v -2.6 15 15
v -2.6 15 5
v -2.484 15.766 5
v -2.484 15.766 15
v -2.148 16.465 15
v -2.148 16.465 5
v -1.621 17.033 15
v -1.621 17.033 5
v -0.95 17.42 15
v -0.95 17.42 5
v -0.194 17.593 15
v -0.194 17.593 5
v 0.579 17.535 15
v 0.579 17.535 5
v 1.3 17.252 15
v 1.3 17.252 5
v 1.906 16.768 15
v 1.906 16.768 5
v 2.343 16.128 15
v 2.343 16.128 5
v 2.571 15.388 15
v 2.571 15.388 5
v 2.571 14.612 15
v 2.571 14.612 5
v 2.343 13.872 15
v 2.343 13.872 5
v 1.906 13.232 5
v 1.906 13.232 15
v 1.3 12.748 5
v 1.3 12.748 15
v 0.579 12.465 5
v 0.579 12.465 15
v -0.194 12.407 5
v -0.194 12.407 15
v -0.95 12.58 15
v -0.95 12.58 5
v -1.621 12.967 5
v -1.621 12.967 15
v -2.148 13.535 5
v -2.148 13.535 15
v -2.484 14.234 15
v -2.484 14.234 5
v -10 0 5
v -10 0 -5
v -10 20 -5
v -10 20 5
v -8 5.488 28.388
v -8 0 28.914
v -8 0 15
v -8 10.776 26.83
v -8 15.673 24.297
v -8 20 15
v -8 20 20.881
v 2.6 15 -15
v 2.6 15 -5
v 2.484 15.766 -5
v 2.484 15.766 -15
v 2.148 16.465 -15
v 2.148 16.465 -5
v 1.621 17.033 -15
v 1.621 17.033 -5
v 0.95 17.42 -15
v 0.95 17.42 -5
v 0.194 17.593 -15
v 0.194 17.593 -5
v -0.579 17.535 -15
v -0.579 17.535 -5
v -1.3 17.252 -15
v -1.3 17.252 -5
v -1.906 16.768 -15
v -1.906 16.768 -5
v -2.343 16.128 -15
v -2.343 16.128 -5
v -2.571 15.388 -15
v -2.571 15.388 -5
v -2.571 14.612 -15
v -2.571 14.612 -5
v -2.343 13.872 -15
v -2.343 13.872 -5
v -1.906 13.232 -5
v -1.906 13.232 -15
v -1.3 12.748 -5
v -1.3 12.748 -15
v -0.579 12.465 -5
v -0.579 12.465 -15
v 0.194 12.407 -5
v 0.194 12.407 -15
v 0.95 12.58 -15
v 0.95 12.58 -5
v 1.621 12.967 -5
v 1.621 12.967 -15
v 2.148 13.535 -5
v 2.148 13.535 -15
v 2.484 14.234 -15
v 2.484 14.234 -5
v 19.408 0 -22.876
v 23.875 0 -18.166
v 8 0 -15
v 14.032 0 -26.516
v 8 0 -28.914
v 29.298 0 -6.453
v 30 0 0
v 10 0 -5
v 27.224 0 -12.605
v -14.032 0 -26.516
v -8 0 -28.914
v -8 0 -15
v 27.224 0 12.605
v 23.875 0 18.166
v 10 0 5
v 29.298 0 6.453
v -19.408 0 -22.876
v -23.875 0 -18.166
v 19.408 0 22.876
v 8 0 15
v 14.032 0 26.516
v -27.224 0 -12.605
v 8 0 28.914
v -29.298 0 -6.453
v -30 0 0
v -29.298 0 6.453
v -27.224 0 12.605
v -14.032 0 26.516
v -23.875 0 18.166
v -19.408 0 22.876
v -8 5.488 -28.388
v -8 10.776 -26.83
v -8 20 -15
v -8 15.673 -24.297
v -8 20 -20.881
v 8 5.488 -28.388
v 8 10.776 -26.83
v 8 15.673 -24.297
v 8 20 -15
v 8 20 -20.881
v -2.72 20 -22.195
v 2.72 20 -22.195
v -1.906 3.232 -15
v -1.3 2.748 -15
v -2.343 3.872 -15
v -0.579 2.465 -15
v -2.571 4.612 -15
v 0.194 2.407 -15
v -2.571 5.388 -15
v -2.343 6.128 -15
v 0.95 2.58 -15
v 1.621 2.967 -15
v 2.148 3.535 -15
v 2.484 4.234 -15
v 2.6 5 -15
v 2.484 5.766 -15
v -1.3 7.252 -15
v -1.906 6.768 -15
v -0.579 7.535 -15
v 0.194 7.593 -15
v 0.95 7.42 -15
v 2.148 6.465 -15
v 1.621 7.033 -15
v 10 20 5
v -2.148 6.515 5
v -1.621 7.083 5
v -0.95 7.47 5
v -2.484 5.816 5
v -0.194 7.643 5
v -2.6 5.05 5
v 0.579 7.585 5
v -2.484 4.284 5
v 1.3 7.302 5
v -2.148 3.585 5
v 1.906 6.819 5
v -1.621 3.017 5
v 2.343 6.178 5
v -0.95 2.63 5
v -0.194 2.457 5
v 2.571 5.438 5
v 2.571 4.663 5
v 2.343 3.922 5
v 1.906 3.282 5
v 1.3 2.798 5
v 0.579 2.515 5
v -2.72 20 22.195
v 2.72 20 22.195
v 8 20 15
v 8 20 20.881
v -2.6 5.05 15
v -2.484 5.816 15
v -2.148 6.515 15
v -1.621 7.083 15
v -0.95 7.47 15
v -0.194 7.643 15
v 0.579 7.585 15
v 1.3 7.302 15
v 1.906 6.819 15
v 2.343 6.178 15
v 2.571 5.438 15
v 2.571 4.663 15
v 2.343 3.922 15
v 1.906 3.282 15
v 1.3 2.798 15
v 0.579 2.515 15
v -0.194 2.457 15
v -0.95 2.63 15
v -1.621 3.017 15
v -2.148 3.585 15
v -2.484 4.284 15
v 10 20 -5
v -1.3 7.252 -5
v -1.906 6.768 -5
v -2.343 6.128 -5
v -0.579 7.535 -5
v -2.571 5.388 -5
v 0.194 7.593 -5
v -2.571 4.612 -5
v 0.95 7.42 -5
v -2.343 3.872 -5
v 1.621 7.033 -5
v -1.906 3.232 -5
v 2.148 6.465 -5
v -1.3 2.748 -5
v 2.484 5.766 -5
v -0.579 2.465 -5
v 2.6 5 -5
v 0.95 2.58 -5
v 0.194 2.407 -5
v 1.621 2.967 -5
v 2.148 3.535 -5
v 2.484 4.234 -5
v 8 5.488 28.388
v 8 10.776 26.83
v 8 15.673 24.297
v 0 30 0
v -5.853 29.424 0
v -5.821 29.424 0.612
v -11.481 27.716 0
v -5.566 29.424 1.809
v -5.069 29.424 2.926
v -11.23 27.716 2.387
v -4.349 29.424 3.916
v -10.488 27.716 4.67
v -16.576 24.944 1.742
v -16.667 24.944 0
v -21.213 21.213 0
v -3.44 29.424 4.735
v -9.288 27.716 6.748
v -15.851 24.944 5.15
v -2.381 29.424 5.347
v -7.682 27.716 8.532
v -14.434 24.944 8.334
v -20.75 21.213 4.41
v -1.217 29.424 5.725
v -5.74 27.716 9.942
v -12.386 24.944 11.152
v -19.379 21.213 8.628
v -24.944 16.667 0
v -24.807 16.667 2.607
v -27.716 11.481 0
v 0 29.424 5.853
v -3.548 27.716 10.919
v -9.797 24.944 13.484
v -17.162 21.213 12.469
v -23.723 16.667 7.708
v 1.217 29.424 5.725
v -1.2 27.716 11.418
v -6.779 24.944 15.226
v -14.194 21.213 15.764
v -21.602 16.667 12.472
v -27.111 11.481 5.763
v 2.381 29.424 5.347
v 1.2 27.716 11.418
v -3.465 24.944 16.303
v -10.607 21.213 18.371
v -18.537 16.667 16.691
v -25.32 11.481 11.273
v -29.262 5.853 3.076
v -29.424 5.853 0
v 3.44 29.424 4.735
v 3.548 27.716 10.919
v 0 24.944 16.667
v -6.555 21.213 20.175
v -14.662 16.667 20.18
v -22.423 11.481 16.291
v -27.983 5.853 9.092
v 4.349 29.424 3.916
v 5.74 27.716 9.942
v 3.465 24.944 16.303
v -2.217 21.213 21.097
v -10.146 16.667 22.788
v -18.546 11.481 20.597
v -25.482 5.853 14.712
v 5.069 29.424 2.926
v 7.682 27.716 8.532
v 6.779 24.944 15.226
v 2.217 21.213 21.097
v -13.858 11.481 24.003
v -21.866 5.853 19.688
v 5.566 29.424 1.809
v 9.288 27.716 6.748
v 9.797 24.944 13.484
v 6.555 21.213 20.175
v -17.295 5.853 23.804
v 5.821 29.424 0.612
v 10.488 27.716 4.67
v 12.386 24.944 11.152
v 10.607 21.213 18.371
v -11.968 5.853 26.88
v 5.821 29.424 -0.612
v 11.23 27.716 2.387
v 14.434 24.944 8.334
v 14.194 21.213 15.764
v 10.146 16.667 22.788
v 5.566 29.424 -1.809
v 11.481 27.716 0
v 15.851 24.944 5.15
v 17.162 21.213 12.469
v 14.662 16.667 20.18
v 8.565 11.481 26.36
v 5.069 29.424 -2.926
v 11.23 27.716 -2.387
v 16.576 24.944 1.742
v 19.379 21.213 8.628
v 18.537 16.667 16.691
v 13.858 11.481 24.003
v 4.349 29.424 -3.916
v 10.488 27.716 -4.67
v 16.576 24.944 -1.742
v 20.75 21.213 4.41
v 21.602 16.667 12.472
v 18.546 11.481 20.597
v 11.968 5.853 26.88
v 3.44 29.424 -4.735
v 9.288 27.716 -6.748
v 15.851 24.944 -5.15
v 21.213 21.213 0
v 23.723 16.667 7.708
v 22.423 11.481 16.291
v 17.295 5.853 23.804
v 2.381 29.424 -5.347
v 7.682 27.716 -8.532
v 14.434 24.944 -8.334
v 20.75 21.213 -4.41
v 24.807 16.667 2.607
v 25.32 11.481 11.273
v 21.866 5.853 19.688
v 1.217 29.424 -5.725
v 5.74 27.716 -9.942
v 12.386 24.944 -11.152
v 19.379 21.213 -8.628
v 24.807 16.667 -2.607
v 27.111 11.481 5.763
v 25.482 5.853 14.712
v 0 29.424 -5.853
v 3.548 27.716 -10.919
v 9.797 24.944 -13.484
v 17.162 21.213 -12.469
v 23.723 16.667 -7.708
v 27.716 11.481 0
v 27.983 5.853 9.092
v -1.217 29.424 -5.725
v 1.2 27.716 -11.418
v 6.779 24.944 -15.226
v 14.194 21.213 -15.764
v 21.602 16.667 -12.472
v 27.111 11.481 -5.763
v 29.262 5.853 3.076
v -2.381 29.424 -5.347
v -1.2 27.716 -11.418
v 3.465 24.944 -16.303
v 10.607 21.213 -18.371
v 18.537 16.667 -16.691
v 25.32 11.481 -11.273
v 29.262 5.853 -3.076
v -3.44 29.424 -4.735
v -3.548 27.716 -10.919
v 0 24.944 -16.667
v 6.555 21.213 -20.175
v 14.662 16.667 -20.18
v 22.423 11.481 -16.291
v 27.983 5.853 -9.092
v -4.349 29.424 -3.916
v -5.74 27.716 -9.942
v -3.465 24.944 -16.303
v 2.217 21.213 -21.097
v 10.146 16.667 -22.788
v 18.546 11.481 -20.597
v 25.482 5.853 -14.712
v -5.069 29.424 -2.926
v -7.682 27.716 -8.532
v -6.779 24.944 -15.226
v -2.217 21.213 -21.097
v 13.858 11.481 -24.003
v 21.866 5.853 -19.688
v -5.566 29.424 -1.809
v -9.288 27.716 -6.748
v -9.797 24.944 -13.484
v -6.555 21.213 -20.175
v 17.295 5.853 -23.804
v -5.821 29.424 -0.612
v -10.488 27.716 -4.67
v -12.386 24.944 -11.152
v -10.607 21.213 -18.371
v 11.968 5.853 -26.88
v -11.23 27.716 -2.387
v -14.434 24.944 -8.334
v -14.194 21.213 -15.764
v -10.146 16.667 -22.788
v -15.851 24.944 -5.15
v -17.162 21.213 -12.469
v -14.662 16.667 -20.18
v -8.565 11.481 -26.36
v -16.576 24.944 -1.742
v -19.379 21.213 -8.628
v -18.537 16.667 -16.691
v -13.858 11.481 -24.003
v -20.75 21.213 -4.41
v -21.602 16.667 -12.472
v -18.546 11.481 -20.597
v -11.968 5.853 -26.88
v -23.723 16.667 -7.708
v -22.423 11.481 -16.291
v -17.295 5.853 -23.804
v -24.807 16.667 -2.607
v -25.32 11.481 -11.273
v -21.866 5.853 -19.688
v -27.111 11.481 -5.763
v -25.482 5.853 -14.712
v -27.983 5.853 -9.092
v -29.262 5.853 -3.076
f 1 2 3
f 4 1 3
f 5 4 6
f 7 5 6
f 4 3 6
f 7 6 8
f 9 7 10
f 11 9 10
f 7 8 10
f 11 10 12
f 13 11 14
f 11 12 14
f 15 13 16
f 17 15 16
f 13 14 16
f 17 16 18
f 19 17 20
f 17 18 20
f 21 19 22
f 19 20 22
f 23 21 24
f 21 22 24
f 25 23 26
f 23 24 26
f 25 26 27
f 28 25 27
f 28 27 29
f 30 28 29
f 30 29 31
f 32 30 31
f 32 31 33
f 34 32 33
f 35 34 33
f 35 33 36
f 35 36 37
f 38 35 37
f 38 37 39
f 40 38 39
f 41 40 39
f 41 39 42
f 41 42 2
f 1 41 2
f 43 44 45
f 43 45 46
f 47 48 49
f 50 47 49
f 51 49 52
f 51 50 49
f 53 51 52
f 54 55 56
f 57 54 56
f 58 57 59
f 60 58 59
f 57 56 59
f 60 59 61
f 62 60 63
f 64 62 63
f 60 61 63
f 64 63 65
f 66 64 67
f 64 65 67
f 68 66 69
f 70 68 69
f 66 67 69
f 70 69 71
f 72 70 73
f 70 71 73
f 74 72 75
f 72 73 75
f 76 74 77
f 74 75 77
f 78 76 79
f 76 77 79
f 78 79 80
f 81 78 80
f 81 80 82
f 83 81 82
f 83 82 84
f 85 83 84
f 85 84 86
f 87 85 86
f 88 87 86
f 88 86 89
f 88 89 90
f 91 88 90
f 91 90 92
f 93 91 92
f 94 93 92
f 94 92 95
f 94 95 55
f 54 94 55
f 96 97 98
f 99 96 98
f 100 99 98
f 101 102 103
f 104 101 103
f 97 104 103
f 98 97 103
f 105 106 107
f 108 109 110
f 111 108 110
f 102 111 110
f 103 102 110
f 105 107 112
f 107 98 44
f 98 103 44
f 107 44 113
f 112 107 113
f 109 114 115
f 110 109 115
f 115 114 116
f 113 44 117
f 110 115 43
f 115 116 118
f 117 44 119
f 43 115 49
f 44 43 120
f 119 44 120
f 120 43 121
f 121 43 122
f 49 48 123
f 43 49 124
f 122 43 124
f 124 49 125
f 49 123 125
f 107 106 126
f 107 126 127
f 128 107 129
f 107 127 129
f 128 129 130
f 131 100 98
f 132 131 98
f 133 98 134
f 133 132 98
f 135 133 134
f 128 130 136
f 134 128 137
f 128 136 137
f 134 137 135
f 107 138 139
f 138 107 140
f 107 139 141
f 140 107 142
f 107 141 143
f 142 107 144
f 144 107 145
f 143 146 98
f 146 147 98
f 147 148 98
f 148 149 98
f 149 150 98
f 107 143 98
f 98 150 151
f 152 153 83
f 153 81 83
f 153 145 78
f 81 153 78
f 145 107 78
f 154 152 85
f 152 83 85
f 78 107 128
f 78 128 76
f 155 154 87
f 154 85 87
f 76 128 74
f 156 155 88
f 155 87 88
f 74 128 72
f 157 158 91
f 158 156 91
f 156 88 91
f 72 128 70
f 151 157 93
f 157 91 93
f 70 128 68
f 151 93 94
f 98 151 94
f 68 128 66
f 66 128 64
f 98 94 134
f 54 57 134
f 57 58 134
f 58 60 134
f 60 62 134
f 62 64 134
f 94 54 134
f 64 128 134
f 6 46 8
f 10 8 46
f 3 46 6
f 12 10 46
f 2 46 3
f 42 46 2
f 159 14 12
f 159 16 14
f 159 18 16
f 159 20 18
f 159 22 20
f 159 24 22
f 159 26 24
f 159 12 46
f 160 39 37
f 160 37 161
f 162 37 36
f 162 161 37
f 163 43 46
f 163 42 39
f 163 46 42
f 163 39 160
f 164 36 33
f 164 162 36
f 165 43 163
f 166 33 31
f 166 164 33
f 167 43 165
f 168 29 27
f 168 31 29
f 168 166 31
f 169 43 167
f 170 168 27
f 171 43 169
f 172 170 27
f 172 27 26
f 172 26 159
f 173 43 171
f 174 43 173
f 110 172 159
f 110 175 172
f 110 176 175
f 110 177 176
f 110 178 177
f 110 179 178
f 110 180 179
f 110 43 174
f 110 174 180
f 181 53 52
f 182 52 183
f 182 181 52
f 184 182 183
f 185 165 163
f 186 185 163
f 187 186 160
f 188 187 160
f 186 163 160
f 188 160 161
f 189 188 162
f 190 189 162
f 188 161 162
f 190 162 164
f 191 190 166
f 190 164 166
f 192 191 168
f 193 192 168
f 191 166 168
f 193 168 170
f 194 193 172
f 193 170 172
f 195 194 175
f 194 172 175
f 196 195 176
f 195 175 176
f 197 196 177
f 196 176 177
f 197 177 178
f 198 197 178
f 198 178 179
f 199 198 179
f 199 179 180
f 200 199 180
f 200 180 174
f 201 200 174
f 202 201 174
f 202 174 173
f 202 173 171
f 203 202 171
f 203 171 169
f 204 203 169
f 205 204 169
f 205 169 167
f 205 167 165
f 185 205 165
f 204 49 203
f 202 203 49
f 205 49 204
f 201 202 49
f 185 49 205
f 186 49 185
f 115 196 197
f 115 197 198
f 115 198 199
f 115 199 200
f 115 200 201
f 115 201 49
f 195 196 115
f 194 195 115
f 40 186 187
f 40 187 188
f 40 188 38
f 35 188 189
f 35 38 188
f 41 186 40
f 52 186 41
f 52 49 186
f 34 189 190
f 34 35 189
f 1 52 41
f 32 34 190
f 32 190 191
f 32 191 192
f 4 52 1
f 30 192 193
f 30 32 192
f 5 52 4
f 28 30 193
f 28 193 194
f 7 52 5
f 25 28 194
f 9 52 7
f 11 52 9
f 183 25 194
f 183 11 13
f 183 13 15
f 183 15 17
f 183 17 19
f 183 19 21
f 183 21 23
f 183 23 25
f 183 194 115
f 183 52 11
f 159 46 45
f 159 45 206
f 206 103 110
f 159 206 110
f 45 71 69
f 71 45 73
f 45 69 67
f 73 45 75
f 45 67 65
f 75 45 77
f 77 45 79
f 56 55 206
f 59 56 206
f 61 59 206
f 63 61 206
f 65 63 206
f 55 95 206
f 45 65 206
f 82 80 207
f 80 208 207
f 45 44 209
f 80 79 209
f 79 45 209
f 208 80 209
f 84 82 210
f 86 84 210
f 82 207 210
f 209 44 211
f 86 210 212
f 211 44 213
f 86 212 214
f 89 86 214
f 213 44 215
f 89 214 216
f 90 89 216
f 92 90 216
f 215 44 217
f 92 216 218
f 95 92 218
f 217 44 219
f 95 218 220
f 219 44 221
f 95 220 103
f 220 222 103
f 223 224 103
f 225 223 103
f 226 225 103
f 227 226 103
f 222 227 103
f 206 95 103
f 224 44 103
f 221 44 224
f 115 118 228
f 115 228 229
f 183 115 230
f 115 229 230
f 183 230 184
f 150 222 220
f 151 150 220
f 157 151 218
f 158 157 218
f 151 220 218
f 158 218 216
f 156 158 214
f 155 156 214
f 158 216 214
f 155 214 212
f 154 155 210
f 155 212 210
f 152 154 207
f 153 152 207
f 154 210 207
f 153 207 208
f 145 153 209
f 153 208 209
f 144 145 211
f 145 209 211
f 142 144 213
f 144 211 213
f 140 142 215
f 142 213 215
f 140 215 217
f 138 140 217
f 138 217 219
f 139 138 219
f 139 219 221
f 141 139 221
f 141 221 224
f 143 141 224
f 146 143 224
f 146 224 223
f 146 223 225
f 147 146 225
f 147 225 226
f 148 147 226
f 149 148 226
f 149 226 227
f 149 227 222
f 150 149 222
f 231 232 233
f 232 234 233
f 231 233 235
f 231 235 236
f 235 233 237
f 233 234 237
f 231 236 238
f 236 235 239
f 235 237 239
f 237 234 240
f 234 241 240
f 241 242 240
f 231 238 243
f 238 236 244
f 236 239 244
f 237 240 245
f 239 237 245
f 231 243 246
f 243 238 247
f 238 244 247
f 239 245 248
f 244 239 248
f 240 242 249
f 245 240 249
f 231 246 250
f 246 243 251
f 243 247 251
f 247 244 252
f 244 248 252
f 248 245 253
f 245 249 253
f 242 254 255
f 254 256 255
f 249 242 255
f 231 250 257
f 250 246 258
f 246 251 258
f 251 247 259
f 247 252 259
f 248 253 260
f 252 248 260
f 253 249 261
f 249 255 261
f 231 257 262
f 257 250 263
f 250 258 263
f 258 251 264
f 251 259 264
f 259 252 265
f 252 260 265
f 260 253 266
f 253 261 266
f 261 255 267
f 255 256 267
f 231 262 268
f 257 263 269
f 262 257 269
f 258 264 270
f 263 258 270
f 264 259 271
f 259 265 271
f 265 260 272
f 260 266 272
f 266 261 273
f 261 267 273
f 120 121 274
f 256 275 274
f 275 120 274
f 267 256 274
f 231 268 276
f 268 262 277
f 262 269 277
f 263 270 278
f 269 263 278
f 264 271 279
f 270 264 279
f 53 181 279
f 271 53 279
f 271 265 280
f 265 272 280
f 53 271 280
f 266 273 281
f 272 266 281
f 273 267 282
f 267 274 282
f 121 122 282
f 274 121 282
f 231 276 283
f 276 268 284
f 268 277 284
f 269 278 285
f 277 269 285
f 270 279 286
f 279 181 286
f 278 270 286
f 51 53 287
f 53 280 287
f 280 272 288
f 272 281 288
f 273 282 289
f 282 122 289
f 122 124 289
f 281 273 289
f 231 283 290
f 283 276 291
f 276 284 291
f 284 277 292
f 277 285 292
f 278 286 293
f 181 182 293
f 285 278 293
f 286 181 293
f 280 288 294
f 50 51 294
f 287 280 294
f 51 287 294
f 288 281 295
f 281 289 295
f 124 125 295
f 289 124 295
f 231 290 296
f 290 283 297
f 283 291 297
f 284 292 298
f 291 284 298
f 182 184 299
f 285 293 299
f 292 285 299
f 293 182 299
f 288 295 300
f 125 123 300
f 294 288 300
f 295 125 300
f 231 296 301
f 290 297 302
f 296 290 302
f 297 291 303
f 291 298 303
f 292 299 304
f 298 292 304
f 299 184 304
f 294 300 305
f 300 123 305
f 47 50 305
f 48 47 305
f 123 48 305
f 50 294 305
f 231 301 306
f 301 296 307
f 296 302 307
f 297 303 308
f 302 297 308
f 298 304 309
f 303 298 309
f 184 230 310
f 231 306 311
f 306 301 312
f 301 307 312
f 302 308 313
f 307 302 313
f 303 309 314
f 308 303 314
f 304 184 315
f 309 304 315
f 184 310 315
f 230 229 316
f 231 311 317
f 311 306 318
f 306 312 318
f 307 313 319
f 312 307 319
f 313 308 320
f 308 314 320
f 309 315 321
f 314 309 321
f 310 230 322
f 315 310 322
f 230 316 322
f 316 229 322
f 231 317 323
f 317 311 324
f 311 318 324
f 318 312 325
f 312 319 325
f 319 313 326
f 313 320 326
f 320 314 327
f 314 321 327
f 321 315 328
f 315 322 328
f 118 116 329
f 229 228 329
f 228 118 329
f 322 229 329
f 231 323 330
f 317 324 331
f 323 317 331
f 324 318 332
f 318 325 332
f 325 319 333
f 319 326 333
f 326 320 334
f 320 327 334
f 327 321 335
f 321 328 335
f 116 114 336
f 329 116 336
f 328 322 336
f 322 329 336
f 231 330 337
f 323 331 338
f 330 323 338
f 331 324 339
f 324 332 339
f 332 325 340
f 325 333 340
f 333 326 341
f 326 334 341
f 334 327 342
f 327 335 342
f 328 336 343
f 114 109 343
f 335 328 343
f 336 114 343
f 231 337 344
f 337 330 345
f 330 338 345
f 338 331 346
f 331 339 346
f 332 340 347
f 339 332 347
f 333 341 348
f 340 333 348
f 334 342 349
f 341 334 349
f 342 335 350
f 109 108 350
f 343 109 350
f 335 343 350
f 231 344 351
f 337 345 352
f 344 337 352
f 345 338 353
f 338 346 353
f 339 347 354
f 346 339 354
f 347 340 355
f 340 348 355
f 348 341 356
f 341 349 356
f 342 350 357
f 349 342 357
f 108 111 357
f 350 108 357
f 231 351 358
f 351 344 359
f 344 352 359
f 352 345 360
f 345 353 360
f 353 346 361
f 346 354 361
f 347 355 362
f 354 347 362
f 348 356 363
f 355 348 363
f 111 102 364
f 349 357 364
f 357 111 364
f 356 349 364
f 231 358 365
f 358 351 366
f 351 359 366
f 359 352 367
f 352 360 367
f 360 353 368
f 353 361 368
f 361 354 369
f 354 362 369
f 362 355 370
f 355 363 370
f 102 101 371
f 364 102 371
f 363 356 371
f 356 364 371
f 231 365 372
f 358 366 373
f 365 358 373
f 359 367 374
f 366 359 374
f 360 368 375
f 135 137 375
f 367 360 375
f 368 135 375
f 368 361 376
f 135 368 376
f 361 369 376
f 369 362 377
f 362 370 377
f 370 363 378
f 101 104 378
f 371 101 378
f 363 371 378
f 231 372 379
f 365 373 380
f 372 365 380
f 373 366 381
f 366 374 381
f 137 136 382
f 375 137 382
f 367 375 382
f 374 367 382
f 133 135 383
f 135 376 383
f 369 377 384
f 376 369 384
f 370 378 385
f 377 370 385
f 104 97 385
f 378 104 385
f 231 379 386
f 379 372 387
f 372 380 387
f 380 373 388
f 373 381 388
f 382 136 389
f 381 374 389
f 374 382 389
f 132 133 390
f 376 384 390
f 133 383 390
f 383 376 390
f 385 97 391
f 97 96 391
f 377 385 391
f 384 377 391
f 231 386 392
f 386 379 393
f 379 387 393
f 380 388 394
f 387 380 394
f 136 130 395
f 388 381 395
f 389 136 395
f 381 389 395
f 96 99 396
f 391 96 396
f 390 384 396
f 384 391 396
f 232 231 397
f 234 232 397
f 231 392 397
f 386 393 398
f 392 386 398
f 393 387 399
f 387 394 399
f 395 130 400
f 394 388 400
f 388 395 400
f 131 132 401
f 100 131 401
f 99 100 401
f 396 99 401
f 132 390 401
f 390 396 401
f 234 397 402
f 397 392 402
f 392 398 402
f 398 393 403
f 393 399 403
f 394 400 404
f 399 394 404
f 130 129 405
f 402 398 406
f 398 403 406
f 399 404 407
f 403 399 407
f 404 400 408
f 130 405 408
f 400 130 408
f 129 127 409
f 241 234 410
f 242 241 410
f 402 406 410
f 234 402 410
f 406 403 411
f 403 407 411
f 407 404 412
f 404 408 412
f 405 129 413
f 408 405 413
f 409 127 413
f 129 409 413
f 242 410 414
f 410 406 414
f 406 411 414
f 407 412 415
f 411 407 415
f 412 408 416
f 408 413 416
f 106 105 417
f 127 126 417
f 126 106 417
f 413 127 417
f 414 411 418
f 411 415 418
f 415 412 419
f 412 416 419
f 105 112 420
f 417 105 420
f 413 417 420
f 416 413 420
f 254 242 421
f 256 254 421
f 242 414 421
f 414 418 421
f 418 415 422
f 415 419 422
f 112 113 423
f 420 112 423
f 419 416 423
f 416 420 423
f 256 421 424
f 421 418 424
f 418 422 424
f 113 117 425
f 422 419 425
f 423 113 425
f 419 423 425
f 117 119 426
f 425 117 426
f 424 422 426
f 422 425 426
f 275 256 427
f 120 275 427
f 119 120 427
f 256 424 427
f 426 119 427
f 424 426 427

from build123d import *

# Parameters (mm, degrees)
SKETCH3_W           = 20
SKETCH3_H           = 10
CUT_EXTRUDE1_DEPTH  = 20
SKETCH4_R           = 2.6
CUT_EXTRUDE2_DEPTH  = 26
SKETCH7_R           = 2.6
CUT_EXTRUDE4_DEPTH  = 26
SKETCH8_W           = 16
SKETCH8_H           = 20
CUT_EXTRUDE9_DEPTH  = 15
SKETCH6_W           = 16
SKETCH6_H           = 20
CUT_EXTRUDE10_DEPTH = 15


with BuildPart() as part:
    # Sketch2 → Revolve1 (revolve)
    with BuildSketch(Plane.XY):
        with BuildLine():
            Line((-30, 0), (0, 0))
            Line((0, 0), (0, 30))
            ThreePointArc((0, 30), (-21.213203436, 21.213203436), (-30, 0))
        make_face()
    revolve(axis=Axis((0, 0, 0), (0, 1, 0)))

    # Sketch3 → Cut-Extrude1 (cut)
    with BuildSketch(Plane.XZ):
        Rectangle(SKETCH3_W, SKETCH3_H)
    extrude(amount=-CUT_EXTRUDE1_DEPTH, mode=Mode.SUBTRACT)

    # Sketch4 → Cut-Extrude2 (cut, through all)
    with BuildSketch(Plane(origin=(0, 0, 5), x_dir=(-1, 0, 0), z_dir=(0, 0, -1))):
        with Locations((0, 15)):
            Circle(SKETCH4_R)
        with Locations((0, 5.050125629)):
            Circle(SKETCH4_R)
    extrude(amount=-CUT_EXTRUDE2_DEPTH, mode=Mode.SUBTRACT)

    # Sketch7 → Cut-Extrude4 (cut, through all)
    with BuildSketch(Plane.XY.offset(-5)):
        with Locations((0, 5)):
            Circle(SKETCH7_R)
        with Locations((0, 15)):
            Circle(SKETCH7_R)
    extrude(amount=-CUT_EXTRUDE4_DEPTH, mode=Mode.SUBTRACT)

    # Sketch8 → Cut-Extrude9 (cut)
    with BuildSketch(Plane.XY.offset(-30)):
        with Locations((0, 10)):
            Rectangle(SKETCH8_W, SKETCH8_H)
    extrude(amount=CUT_EXTRUDE9_DEPTH, mode=Mode.SUBTRACT)

    # Sketch6 → Cut-Extrude10 (cut)
    with BuildSketch(Plane.XY.offset(30)):
        with Locations((0, 10)):
            Rectangle(SKETCH6_W, SKETCH6_H)
    extrude(amount=-CUT_EXTRUDE10_DEPTH, mode=Mode.SUBTRACT)


solid = part.part
